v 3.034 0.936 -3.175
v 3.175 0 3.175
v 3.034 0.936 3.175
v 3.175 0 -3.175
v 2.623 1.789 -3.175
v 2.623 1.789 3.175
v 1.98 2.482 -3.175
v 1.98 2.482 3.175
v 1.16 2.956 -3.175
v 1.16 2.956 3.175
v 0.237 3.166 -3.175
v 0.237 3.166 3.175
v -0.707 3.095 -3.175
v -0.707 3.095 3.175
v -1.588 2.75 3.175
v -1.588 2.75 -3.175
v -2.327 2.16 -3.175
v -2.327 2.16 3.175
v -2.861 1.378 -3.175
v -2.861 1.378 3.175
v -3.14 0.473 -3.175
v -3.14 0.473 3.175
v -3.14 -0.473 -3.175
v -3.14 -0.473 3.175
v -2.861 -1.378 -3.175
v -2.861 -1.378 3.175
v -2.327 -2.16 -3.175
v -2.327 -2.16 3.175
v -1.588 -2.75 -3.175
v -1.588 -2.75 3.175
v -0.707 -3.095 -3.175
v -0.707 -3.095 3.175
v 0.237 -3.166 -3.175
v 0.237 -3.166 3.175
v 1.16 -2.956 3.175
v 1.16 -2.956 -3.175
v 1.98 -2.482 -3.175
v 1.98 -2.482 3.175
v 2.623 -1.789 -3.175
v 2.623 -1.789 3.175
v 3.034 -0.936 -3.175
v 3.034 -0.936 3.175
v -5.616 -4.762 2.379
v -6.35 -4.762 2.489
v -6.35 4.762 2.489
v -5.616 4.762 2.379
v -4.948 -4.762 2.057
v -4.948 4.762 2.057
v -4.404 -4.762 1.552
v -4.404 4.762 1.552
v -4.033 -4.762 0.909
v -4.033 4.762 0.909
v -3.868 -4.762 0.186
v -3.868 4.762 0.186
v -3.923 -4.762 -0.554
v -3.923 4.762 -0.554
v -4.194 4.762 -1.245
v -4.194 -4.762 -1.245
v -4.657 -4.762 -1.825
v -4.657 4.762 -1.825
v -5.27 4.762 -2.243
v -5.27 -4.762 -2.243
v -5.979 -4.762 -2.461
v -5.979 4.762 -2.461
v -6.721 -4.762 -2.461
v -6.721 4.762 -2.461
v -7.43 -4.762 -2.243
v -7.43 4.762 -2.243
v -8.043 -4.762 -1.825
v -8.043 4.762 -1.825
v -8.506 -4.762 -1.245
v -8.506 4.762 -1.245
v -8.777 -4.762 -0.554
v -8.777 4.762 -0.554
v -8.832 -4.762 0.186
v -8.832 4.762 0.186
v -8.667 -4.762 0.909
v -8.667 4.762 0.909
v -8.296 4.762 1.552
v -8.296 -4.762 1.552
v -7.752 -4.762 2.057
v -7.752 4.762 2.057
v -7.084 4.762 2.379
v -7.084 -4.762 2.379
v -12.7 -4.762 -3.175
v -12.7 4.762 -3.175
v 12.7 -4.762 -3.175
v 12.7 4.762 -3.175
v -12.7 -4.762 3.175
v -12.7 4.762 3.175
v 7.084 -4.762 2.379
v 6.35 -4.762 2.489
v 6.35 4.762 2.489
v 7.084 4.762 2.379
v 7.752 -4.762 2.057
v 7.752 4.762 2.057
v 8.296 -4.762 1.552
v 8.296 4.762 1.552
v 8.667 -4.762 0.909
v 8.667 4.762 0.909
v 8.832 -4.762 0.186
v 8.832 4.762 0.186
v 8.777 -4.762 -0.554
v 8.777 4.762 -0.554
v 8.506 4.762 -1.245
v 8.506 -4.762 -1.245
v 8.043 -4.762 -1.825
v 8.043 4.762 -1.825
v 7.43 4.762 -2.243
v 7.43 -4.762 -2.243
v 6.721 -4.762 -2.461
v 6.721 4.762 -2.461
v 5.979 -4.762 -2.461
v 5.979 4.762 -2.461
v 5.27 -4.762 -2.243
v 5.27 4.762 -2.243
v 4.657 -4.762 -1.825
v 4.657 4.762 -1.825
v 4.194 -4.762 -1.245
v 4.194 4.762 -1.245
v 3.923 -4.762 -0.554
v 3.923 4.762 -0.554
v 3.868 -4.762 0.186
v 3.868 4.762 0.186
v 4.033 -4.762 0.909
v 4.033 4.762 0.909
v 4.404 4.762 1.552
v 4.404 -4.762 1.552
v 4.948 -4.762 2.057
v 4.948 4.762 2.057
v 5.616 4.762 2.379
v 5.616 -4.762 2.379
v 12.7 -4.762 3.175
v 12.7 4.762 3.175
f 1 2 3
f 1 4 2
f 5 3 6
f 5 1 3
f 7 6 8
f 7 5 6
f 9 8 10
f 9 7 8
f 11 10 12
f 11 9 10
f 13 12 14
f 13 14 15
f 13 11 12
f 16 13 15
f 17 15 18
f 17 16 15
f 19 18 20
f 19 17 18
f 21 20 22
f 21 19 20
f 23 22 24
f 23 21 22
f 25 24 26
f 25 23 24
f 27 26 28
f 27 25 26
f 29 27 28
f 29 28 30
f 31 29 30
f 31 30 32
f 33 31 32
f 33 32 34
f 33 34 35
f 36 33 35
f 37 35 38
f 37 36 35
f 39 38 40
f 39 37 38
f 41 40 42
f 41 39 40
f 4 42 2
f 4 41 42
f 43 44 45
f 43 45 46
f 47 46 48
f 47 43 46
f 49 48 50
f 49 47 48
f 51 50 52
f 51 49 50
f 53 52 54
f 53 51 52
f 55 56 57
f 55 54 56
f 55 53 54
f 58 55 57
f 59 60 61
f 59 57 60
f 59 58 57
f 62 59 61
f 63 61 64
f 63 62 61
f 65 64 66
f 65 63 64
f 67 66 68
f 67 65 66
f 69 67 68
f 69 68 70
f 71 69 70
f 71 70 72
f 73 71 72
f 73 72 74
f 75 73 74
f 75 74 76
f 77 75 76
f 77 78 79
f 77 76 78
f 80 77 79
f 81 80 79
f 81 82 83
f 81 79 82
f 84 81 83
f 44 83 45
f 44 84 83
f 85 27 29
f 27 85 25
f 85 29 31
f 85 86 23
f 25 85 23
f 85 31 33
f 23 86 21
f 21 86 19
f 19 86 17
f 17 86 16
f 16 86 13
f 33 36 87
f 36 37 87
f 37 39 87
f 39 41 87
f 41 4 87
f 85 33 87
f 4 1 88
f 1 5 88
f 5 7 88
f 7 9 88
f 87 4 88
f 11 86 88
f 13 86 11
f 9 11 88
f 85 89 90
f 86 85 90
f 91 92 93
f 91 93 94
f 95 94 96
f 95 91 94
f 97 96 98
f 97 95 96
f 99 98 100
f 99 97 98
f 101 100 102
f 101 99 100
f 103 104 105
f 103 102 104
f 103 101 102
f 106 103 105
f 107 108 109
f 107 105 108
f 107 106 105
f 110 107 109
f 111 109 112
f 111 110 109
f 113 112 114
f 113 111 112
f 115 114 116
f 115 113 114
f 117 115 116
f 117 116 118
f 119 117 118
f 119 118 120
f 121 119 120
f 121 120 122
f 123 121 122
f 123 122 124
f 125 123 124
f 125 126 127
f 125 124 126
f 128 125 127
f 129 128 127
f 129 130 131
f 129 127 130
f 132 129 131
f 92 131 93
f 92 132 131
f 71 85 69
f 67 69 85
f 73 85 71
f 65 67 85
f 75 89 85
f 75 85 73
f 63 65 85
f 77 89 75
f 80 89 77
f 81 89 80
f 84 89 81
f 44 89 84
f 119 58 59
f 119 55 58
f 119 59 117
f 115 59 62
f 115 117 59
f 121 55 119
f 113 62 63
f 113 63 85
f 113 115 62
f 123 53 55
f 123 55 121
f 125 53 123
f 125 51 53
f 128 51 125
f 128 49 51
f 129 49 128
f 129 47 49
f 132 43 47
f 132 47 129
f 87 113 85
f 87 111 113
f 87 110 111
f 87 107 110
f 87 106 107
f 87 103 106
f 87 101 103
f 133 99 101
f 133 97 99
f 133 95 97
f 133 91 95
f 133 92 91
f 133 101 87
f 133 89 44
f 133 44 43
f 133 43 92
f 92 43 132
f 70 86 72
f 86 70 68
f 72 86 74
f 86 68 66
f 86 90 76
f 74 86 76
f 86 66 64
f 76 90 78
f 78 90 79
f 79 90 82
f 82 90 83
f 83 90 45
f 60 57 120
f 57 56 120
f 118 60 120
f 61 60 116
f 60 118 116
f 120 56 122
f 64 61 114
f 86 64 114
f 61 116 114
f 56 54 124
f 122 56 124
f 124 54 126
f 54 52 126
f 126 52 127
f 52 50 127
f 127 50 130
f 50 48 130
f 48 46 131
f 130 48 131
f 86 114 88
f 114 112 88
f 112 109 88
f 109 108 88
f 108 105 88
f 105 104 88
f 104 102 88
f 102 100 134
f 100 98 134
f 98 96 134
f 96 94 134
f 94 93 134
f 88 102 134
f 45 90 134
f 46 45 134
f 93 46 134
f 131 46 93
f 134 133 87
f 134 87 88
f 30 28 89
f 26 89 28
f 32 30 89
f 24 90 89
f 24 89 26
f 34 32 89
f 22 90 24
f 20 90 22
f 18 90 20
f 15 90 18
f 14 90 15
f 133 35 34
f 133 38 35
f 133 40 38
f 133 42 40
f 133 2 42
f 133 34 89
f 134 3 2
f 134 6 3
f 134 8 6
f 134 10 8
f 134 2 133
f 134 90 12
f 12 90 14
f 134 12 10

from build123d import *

# Parameters (mm, degrees)
SKETCH1_W               = 25.4
SKETCH1_H               = 9.525
SKETCH1_R               = 3.175
BOSS_EXTRUDE1_DEPTH     = 3.175
CUT_EXTRUDE1_DEPTH      = 14.930255965
CUT_EXTRUDE1_DEPTH_BACK = 14.930255965
SKETCH2_R               = 2.4892


with BuildPart() as part:
    # Sketch1 → Boss-Extrude1 (new, symmetric)
    with BuildSketch(Plane.XY):
        Rectangle(SKETCH1_W, SKETCH1_H)
        Circle(SKETCH1_R, mode=Mode.SUBTRACT)
    extrude(amount=BOSS_EXTRUDE1_DEPTH, both=True)

    # Sketch2 → Cut-Extrude1 (cut, two sides: drawn at the far end of the back side and taken through both)
    with BuildSketch(Plane(origin=(0, 0, 0), x_dir=(1, 0, 0), z_dir=(0, 1, 0)).offset(-CUT_EXTRUDE1_DEPTH_BACK)):
        with Locations(Location((6.35, 0, 0), (0, 0, 270))):
            Circle(SKETCH2_R)
        with Locations(Location((-6.35, 0, 0), (0, 0, 270))):
            Circle(SKETCH2_R)
    extrude(amount=CUT_EXTRUDE1_DEPTH + CUT_EXTRUDE1_DEPTH_BACK, mode=Mode.SUBTRACT)


solid = part.part
